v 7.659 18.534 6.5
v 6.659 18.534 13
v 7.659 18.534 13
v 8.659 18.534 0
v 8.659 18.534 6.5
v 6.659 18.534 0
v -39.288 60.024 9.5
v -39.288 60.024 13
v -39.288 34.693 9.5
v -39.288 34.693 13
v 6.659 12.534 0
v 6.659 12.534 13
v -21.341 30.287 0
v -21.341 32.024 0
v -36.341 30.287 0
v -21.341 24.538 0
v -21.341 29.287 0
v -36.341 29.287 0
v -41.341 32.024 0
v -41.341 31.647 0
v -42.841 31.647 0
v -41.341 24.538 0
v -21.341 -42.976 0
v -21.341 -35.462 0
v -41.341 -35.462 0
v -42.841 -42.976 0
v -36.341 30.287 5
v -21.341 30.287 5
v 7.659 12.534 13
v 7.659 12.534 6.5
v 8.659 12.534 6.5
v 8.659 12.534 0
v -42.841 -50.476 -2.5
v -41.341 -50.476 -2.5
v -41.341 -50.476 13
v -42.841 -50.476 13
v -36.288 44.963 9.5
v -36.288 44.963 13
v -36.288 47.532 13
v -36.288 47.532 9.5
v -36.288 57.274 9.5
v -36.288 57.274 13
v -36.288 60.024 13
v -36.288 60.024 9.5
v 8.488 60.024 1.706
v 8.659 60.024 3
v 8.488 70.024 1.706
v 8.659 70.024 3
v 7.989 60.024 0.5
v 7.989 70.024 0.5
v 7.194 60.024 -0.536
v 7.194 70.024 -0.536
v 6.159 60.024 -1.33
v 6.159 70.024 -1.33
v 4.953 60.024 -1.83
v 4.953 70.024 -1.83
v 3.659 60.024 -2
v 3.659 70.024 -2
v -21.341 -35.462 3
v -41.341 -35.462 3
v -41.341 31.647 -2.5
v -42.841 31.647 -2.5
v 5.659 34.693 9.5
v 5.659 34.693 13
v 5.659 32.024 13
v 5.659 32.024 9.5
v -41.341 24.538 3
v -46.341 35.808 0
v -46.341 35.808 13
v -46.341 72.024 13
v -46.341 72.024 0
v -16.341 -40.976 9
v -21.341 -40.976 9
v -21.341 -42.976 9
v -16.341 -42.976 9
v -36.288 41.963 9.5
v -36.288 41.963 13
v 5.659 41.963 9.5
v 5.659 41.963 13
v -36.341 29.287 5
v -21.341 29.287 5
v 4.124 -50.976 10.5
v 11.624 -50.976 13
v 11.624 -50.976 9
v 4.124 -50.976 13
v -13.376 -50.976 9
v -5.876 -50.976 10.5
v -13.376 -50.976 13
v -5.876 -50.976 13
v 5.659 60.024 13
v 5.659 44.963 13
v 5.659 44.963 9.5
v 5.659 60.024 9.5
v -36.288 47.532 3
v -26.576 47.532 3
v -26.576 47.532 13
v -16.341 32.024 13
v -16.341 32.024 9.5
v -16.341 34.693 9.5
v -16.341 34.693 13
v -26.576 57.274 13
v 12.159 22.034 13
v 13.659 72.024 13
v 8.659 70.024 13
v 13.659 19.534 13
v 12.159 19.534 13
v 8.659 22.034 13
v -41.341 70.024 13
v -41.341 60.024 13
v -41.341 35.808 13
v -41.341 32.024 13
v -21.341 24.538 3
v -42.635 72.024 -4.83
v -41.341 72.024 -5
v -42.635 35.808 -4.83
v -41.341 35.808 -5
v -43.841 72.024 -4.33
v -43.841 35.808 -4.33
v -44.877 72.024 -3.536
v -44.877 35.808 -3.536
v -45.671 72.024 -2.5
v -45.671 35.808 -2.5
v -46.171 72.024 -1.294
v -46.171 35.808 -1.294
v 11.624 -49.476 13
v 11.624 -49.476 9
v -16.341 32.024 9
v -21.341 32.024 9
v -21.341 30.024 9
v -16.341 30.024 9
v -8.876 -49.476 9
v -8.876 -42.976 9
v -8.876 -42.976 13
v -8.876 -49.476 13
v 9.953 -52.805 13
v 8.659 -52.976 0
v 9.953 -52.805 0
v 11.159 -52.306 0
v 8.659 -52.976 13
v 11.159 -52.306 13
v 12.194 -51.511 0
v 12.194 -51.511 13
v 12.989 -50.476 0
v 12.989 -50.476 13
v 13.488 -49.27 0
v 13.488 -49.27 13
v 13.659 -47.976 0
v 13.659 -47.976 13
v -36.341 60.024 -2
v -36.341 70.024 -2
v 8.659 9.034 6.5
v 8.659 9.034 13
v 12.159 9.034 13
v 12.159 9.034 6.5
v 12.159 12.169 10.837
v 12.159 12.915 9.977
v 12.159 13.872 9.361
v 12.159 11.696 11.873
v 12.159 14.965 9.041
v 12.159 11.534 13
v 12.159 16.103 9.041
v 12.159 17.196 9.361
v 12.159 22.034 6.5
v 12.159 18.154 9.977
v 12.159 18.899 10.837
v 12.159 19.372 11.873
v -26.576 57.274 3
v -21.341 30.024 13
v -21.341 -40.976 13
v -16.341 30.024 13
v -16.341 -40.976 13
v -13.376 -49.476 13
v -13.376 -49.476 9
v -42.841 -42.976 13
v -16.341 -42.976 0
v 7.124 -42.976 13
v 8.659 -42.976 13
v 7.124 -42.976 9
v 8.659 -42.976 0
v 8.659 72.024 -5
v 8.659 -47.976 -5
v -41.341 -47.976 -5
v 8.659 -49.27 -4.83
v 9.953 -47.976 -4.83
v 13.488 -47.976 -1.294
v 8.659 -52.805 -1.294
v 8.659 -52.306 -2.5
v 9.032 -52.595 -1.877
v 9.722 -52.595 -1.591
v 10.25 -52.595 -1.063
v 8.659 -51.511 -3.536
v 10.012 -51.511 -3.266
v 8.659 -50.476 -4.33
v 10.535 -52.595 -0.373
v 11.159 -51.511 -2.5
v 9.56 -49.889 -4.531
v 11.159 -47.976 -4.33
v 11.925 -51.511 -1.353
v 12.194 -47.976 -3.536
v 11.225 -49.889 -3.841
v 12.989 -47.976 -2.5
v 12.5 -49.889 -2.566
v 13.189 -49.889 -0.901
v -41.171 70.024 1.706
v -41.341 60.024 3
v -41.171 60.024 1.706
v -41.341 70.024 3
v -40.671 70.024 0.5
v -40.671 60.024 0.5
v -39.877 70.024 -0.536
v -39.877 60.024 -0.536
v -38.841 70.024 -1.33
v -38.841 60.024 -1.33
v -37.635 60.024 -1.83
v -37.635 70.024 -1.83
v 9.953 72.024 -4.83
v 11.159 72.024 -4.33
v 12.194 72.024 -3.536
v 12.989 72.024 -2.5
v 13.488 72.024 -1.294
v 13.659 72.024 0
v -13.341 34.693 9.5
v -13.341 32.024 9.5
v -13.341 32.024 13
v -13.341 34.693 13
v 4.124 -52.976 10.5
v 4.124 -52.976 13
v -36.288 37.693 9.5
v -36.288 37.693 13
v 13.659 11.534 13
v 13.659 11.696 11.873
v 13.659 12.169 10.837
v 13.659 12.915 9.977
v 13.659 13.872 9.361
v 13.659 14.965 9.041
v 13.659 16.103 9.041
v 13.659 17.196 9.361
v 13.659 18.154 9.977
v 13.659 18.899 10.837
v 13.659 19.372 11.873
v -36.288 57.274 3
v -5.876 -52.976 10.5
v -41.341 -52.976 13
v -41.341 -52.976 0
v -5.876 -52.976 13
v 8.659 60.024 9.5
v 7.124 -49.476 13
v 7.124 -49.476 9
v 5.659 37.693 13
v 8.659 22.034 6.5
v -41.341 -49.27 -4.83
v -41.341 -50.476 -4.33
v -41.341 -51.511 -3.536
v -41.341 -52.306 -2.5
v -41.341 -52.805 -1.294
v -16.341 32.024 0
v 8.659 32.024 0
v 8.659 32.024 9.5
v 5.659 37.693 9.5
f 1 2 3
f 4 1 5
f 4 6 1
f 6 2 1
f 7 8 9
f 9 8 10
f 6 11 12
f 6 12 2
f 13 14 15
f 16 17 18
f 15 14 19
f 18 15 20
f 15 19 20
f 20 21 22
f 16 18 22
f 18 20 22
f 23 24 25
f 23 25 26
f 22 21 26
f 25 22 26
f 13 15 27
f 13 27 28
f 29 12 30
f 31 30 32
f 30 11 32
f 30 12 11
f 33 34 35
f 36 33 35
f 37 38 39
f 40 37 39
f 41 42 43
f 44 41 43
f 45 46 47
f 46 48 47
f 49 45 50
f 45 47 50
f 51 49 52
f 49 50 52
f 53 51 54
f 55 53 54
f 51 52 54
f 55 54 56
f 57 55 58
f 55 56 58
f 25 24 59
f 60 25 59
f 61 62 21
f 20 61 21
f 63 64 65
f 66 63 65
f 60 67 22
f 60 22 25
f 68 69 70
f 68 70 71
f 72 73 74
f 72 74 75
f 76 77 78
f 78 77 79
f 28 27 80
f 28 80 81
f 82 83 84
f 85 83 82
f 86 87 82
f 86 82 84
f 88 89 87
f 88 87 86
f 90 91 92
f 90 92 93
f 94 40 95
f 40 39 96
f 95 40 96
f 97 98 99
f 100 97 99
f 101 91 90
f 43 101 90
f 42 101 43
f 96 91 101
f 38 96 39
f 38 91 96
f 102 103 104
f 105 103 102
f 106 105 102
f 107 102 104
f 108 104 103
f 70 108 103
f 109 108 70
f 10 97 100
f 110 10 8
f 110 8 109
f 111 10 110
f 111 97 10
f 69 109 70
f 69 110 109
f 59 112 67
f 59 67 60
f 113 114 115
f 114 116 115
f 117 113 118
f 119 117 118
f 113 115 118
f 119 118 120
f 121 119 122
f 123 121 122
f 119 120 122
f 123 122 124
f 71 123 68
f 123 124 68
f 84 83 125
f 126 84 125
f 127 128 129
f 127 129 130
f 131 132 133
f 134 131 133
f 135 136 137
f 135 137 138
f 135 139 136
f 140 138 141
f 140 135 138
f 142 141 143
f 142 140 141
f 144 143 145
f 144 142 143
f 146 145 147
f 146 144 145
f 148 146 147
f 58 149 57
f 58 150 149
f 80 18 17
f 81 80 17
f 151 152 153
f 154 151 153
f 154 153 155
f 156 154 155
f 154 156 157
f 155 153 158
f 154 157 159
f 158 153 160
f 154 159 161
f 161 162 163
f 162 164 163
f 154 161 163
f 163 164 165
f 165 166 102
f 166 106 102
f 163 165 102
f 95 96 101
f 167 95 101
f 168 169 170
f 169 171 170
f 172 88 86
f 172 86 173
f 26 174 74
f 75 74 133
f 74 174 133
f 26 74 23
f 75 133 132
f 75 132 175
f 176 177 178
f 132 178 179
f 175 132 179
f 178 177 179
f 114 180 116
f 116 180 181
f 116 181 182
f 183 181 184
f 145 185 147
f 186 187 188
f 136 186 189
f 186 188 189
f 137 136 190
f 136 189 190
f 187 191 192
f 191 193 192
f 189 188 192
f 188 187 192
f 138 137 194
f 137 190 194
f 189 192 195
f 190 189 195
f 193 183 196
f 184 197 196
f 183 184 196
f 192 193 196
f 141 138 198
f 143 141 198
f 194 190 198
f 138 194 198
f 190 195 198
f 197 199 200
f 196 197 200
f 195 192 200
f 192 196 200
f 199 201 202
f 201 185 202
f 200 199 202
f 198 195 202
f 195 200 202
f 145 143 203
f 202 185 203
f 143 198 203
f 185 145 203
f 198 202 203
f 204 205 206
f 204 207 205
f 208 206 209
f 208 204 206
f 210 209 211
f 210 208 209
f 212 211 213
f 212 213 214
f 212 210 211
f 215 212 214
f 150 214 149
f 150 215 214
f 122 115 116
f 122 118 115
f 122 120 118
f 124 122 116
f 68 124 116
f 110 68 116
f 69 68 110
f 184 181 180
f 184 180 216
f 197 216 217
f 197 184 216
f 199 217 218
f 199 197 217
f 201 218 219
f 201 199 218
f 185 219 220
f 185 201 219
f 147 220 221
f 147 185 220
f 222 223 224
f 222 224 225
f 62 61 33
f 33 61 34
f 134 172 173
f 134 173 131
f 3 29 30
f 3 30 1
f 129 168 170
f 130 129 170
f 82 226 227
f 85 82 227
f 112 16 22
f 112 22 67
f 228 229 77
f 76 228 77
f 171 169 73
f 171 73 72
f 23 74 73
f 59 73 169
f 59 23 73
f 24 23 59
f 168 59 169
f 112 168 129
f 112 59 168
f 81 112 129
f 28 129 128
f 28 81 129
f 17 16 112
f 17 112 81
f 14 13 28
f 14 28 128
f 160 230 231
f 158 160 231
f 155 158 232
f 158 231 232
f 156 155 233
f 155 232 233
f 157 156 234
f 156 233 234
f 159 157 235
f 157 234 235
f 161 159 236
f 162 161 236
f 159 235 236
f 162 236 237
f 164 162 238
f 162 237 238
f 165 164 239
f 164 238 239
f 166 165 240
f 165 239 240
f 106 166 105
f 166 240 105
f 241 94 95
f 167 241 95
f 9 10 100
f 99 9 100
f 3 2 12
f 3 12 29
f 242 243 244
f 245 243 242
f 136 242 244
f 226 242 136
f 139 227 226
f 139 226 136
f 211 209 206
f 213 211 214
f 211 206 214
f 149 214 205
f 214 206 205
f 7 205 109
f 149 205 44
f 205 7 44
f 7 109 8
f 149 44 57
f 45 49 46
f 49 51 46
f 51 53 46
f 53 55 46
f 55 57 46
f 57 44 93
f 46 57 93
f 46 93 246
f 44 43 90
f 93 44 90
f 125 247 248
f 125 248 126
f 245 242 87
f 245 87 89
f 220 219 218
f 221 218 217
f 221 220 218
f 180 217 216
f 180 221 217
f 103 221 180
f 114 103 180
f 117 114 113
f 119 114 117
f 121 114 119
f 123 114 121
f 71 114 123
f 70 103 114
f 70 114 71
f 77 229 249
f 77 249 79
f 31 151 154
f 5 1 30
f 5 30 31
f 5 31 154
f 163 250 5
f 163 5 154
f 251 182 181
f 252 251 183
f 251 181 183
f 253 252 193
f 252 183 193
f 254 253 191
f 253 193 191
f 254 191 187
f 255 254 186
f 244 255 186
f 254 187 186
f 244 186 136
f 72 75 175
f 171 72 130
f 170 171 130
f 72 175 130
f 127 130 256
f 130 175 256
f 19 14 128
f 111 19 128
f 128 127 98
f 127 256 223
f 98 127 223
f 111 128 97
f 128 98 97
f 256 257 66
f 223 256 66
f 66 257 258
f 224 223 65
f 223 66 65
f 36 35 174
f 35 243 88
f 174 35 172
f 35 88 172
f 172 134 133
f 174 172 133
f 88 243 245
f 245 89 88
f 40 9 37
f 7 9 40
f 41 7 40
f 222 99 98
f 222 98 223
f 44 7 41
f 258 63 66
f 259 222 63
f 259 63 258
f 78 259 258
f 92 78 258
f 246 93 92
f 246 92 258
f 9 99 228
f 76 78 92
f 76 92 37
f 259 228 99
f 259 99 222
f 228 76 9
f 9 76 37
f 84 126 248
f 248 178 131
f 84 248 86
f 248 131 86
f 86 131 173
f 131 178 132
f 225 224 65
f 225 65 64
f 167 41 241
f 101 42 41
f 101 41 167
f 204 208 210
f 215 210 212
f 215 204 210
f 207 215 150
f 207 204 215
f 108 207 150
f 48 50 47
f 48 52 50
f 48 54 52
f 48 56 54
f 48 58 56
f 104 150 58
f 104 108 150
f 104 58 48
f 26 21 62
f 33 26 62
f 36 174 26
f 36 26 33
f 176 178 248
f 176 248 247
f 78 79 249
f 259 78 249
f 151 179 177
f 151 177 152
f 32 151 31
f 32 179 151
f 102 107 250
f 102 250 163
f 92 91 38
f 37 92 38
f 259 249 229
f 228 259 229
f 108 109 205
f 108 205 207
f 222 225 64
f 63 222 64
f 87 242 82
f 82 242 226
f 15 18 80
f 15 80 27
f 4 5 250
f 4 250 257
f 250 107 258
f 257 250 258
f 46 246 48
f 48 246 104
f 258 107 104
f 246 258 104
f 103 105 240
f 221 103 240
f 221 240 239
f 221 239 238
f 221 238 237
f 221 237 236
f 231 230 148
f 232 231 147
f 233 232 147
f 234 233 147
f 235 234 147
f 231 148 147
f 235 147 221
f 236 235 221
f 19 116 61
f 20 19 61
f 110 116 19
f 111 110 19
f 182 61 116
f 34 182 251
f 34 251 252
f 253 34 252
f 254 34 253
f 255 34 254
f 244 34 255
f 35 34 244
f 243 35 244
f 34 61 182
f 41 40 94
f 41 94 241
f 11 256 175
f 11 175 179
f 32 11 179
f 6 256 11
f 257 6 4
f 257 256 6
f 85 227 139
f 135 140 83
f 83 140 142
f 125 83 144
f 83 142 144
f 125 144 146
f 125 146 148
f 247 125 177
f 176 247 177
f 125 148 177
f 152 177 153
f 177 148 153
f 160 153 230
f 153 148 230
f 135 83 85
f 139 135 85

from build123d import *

# Parameters (mm, degrees)
F0_W      = 20
F0_H      = 75
F0_W_2    = 25
F1_DEPTH  = 13
F2_DEPTH  = 5
F3_R      = 4
F4_DEPTH  = 5
F5_W      = 3.5
F5_H      = 13
F6_DEPTH  = 6.5
F7_W      = 88.7834078074
F7_H      = 18
F8_DEPTH  = 5
F10_DEPTH = 5
F11_W     = 1.2834078074
F11_H     = 13
F12_DEPTH = 5
F13_W     = 3
F13_H     = 2.6685215533
F13_H_2   = 1.2419745326
F13_W_2   = 0.7530017495
F13_H_3   = 3
F14_DEPTH = 3.5
F15_W     = 5
F15_H     = 2
F16_DEPTH = 4
F17_W     = 15
F17_H     = 1
F18_DEPTH = 5
F19_R     = 5
F20_W     = 10
F20_H     = 2.5
F21_DEPTH = 10
F22_W     = 16
F22_H     = 4
F23_DEPTH = 8
F24_W     = 25
F24_H     = 1.5
F25_DEPTH = 4
F27_DEPTH = 3.5
F28_W     = 2
F28_H     = 6
F29_DEPTH = 13
F30_W     = 1
F30_H     = 6
F31_DEPTH = 6.5
F32_W     = 1.6611641645
F32_H     = 2.5
F33_DEPTH = 1.5
F35_DEPTH = 3.5
F36_DEPTH = 25
F37_W     = 50
F37_H     = 10
F38_DEPTH = 15
F39_R     = 5
F40_W     = 9.7111338079
F40_H     = 9.7418390214
F41_DEPTH = 10
F42_DEPTH = 3.5
F40_W_2   = 3
F40_H_2   = 15.0616638362
F43_DEPTH = 3.5
F44_W     = 60
F44_H     = 3
F45_DEPTH = 20


with BuildPart() as f1:
    # F0 (on Top) → F1 (new body)
    with BuildSketch(Plane.XY):
        Polygon((-26.3411931316, 47.0243954659), (-46.3411931316, 47.0243954659), (-46.3411931316, -52.9756045341), (13.6588068684, -52.9756045341), (13.6588068684, 47.0243954659), (-6.3411931316, 47.0243954659), align=None)
        with Locations((-31.3411931316, -5.4756045341)):
            Rectangle(F0_W, F0_H, mode=Mode.SUBTRACT)
        with Locations((-3.8411931316, -5.4756045341)):
            Rectangle(F0_W_2, F0_H, mode=Mode.SUBTRACT)
    extrude(amount=F1_DEPTH)

    # F0 (on Top) → F2 (join)
    with BuildSketch(Plane.XY):
        Polygon((-26.3411931316, 47.0243954659), (-46.3411931316, 47.0243954659), (-46.3411931316, -52.9756045341), (13.6588068684, -52.9756045341), (13.6588068684, 47.0243954659), (-6.3411931316, 47.0243954659), align=None)
        with Locations((-31.3411931316, -5.4756045341)):
            Rectangle(F0_W, F0_H, mode=Mode.SUBTRACT)
        with Locations((-3.8411931316, -5.4756045341)):
            Rectangle(F0_W_2, F0_H, mode=Mode.SUBTRACT)
        with Locations((-3.8411931316, -5.4756045341)):
            Rectangle(F0_W_2, F0_H)
        with Locations((-31.3411931316, -5.4756045341)):
            Rectangle(F0_W, F0_H)
    extrude(amount=-F2_DEPTH)

    # F3 (on face) → F4 (cut)
    with BuildSketch(Plane.YZ.offset(13.6588068684)):
        with Locations((15.5341364443, 13)):
            Circle(F3_R)
    extrude(amount=-F4_DEPTH, mode=Mode.SUBTRACT)

    # F5 (on face) → F6 (cut)
    with BuildSketch(Plane.XY.offset(13)):
        with Locations((10.4088068684, 15.5341364443)):
            Rectangle(F5_W, F5_H)
    extrude(amount=-F6_DEPTH, mode=Mode.SUBTRACT)

    # F7 (on face) → F8 (cut)
    with BuildSketch(Plane(origin=(-46.3411931316, 0, 0), x_dir=(0, -1, 0), z_dir=(-1, 0, 0))):
        with Locations((8.5839006305, 4)):
            Rectangle(F7_W, F7_H)
    extrude(amount=-F8_DEPTH, mode=Mode.SUBTRACT)

    # F9 (on face) → F10 (join)
    with BuildSketch(Plane(origin=(-41.3411931316, 0, 0), x_dir=(0, -1, 0), z_dir=(-1, 0, 0))):
        Polygon((-33.3078032732, 13), (-33.3078032732, -2.5), (50.4756045341, -2.5), (50.4756045341, 13), (42.9756045341, 13), (42.9756045341, 0), (-32.0243954659, 0), (-32.0243954659, 13), align=None)
    extrude(amount=F10_DEPTH)

    # F11 (on face) → F12 (cut)
    with BuildSketch(Plane(origin=(-46.3411931316, 0, 0), x_dir=(0, -1, 0), z_dir=(-1, 0, 0))):
        with Locations((-32.6660993695, 6.5)):
            Rectangle(F11_W, F11_H)
    extrude(amount=-F12_DEPTH, mode=Mode.SUBTRACT)

    # F13 (on face) → F14 (cut)
    with BuildSketch(Plane.XY.offset(13)):
        Polygon((5.6588068684, 32.0243954659), (8.6588068684, 32.0243954659), (8.6588068684, 42.0243954659), (5.6588068684, 42.0243954659), (5.6588068684, 37.6929170191), (5.6588068684, 34.6929170191), align=None)
        Polygon((-13.3411931316, 34.6929170191), (5.6588068684, 34.6929170191), (5.6588068684, 37.6929170191), (-36.2876081169, 37.6929170191), (-36.2876081169, 34.6929170191), (-16.3411931316, 34.6929170191), (-16.3411931316, 35.9348915517), (-13.3411931316, 35.9348915517), align=None)
        with Locations((-14.8411931316, 33.3586562425)):
            Rectangle(F13_W, F13_H)
        with Locations((-14.8411931316, 35.3139042854)):
            Rectangle(F13_W, F13_H_2)
        with Locations((-36.6641089916, 36.1929170191)):
            Rectangle(F13_W_2, F13_H_3)
        Polygon((-37.0406098664, 37.6929170191), (-36.2876081169, 37.6929170191), (-36.2876081169, 41.9627316296), (-39.2876081169, 41.9627316296), (-39.2876081169, 34.6929170191), (-37.0406098664, 34.6929170191), align=None)
    extrude(amount=-F14_DEPTH, mode=Mode.SUBTRACT)

    # F15 (on face) → F16 (cut)
    with BuildSketch(Plane.XY.offset(13)):
        with Locations((-18.8411931316, 31.0243954659)):
            Rectangle(F15_W, F15_H)
        with Locations((-18.8411931316, -41.9756045341)):
            Rectangle(F15_W, F15_H)
    extrude(amount=-F16_DEPTH, mode=Mode.SUBTRACT)

    # F17 (on face) → F18 (join)
    with BuildSketch(Plane.XY):
        with Locations((-28.8411931316, 29.7873775363)):
            Rectangle(F17_W, F17_H)
    extrude(amount=F18_DEPTH)

    # F19
    f19_edges = [f1.edges().sort_by_distance(p)[0] for p in [
        (13.658807, -2.975605, -5),
        (-13.841193, -52.975605, -5),
        (13.658807, -52.975605, 4),
        (-46.341193, 41.416099, -5),
    ]]
    fillet(f19_edges, radius=F19_R)

    # F20 (on face) → F21 (cut)
    with BuildSketch(Plane.XZ.offset(52.9756045341)):
        with Locations((-0.8757225672, 11.75)):
            Rectangle(F20_W, F20_H)
    extrude(amount=-F21_DEPTH, mode=Mode.SUBTRACT)

    # F22 (on face) → F23 (cut)
    with BuildSketch(Plane(origin=(0, -42.9756045341, 0), x_dir=(-1, 0, 0), z_dir=(0, 1, 0))):
        with Locations((0.8757225672, 11)):
            Rectangle(F22_W, F22_H)
    extrude(amount=-F23_DEPTH, mode=Mode.SUBTRACT)

    # F24 (on face) → F25 (cut)
    with BuildSketch(Plane.XY.offset(13)):
        with Locations((-0.8757225672, -50.2256045341)):
            Rectangle(F24_W, F24_H)
    extrude(amount=-F25_DEPTH, mode=Mode.SUBTRACT)

    # F26 (on face) → F27 (cut)
    with BuildSketch(Plane(origin=(-46.3411931316, 0, 0), x_dir=(0, -1, 0), z_dir=(-1, 0, 0))):
        Polygon((-33.3078032732, 0), (-33.3078032732, -2.5), (50.4756045341, -2.5), (50.4756045341, 13), (42.9756045341, 13), (42.9756045341, 0), align=None)
    extrude(amount=-F27_DEPTH, mode=Mode.SUBTRACT)

    # F28 (on face) → F29 (join)
    with BuildSketch(Plane.XY):
        with Locations((7.6588068684, 15.5341364443)):
            Rectangle(F28_W, F28_H)
    extrude(amount=F29_DEPTH)

    # F30 (on face) → F31 (cut)
    with BuildSketch(Plane.XY.offset(13)):
        with Locations((8.1588068684, 15.5341364443)):
            Rectangle(F30_W, F30_H)
    extrude(amount=-F31_DEPTH, mode=Mode.SUBTRACT)

    # F32 (on face) → F33 (cut)
    with BuildSketch(Plane(origin=(-42.8411931316, 0, 0), x_dir=(0, -1, 0), z_dir=(-1, 0, 0))):
        with Locations((-32.4772211909, -1.25)):
            Rectangle(F32_W, F32_H)
    extrude(amount=-F33_DEPTH, mode=Mode.SUBTRACT)

    # F34 (on face) → F35 (cut)
    with BuildSketch(Plane.XY.offset(13)):
        Polygon((-39.2876081169, 44.9627316296), (-39.2876081169, 41.9627316296), (-36.2876081169, 41.9627316296), (5.6588068684, 41.9627316296), (5.6588068684, 42.0243954659), (8.6588068684, 42.0243954659), (8.6588068684, 44.9627316296), align=None)
    extrude(amount=-F35_DEPTH, mode=Mode.SUBTRACT)

    # F36 (add): a face of the model
    f36_faces = [f1.faces().sort_by_distance(p)[0] for p in [
        (-16.3411931316, 47.0243954659, 4.07910728),
    ]]
    extrude(f36_faces, amount=F36_DEPTH)

    # F37 (on face) → F38 (cut)
    with BuildSketch(Plane.XY.offset(13)):
        with Locations((-16.3411931316, 65.0243954659)):
            Rectangle(F37_W, F37_H)
    extrude(amount=-F38_DEPTH, mode=Mode.SUBTRACT)

    # F39
    f39_edges = [f1.edges().sort_by_distance(p)[0] for p in [
        (8.658807, 65.024395, -2),
        (-41.341193, 65.024395, -2),
    ]]
    fillet(f39_edges, radius=F39_R)

    # F40 (on face) → F41 (cut)
    with BuildSketch(Plane.XY.offset(13)):
        with Locations((-31.4320412129, 52.4028521031)):
            Rectangle(F40_W, F40_H)
    extrude(amount=-F41_DEPTH, mode=Mode.SUBTRACT)

    # F40 (on face) → F42 (cut)
    with BuildSketch(Plane.XY.offset(13)):
        Polygon((-39.2876081169, 60.0243954659), (-39.2876081169, 44.9627316296), (-36.2876081169, 44.9627316296), (-36.2876081169, 47.5319325924), (-36.2876081169, 57.2737716138), (-36.2876081169, 60.0243954659), align=None)
    extrude(amount=-F42_DEPTH, mode=Mode.SUBTRACT)

    # F40 (on face) → F43 (cut)
    with BuildSketch(Plane.XY.offset(13)):
        with Locations((7.1588068684, 52.4935635477)):
            Rectangle(F40_W_2, F40_H_2)
    extrude(amount=-F43_DEPTH, mode=Mode.SUBTRACT)

    # F44 (on face) → F45 (join)
    with BuildSketch(Plane(origin=(-21.3411931316, 0, 0), x_dir=(0, -1, 0), z_dir=(-1, 0, 0))):
        with Locations((5.4616580904, 1.5)):
            Rectangle(F44_W, F44_H)
    extrude(amount=F45_DEPTH)


solid = f1.part
